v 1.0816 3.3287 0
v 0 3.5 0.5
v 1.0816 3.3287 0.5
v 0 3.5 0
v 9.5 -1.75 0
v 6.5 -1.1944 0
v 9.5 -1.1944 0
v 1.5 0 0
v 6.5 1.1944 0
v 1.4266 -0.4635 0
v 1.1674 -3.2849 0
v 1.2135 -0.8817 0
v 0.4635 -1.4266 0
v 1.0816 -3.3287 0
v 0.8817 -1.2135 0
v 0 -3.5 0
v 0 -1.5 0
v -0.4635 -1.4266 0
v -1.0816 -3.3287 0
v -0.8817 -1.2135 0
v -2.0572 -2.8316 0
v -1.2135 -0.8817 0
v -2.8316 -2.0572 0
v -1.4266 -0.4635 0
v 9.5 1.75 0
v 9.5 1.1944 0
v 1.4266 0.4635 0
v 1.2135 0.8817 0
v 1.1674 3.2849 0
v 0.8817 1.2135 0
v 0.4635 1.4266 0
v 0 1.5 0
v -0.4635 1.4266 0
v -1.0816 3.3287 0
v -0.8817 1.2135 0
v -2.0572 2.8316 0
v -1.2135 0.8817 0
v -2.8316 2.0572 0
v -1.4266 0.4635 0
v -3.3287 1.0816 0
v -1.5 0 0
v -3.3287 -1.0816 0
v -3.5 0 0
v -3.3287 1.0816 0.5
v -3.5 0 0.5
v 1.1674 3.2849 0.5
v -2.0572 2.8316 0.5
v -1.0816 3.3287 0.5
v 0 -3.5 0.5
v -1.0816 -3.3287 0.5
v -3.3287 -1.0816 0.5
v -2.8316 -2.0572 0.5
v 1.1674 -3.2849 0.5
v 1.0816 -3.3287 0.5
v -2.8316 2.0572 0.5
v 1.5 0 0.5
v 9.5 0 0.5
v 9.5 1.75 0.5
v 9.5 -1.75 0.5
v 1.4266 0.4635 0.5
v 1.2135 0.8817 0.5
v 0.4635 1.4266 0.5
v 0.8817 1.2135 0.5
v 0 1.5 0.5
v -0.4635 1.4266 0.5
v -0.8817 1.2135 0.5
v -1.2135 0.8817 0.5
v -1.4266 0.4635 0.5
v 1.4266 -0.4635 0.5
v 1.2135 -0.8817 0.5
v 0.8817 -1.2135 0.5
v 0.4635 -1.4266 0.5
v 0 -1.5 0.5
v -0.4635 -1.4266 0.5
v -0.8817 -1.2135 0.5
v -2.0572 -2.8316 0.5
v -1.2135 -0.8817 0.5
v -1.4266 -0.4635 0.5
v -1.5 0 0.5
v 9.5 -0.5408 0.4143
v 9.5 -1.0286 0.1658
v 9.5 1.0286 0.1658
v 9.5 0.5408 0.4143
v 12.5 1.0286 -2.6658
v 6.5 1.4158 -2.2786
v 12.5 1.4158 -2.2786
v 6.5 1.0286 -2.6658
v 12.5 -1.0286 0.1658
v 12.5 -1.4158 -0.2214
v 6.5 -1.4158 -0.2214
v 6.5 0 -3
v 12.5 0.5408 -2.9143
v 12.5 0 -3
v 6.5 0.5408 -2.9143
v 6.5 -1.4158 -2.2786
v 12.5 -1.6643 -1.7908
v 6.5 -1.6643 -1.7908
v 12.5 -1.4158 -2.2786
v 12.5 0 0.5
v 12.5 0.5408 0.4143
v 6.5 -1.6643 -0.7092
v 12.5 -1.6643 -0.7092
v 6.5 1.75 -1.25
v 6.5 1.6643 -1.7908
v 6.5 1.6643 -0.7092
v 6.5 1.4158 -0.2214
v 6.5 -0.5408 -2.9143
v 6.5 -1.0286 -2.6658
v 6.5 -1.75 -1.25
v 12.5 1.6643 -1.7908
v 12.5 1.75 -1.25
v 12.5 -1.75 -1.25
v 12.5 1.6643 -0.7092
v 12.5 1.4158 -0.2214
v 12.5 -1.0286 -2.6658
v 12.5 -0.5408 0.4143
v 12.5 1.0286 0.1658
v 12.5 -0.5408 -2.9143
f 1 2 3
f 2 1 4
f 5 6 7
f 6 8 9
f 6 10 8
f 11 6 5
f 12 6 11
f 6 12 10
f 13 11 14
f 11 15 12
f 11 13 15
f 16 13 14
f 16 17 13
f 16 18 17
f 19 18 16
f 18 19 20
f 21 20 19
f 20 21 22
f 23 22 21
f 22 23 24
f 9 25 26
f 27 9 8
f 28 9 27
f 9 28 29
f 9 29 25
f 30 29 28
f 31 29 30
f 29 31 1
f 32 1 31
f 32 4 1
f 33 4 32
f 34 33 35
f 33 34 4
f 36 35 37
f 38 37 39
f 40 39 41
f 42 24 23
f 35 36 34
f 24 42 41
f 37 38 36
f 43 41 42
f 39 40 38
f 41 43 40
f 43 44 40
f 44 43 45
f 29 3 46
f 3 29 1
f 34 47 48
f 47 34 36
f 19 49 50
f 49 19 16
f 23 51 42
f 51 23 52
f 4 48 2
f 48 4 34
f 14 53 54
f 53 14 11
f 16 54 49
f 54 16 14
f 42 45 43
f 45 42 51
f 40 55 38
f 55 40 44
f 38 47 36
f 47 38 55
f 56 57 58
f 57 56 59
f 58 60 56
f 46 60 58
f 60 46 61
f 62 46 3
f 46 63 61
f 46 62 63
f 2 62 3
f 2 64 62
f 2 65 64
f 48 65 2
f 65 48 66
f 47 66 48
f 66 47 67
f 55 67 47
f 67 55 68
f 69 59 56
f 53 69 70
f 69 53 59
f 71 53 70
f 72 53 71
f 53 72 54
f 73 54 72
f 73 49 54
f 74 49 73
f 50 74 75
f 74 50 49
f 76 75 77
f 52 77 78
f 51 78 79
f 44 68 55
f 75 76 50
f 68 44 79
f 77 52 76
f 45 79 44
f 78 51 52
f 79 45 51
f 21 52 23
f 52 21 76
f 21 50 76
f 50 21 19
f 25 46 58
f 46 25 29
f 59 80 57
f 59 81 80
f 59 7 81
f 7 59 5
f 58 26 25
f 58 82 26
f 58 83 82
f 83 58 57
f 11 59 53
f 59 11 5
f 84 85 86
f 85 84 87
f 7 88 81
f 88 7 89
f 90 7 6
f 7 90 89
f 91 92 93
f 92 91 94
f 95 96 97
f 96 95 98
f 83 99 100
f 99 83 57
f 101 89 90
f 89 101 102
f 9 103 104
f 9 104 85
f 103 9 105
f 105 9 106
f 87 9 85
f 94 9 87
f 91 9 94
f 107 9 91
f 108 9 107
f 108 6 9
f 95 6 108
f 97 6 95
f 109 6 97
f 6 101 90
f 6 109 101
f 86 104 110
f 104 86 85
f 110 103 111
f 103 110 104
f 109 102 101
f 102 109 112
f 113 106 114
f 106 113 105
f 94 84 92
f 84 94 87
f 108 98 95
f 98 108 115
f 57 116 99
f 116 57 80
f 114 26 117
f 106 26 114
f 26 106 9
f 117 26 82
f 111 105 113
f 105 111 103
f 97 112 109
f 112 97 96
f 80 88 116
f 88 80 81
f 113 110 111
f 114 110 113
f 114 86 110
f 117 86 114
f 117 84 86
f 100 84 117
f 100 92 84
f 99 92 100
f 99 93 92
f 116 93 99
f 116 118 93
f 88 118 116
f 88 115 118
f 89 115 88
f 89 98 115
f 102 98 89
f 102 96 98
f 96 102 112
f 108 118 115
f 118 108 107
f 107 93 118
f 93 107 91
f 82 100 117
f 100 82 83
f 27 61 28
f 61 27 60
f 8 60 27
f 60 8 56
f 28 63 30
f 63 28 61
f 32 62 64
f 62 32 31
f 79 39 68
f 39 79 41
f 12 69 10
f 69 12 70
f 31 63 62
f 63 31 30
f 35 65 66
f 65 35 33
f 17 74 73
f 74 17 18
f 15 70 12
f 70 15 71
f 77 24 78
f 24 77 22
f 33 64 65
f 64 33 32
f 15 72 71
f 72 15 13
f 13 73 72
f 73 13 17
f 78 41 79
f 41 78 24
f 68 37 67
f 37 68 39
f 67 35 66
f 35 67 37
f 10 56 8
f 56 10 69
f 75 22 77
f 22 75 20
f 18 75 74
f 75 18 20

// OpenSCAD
/*
    OpenPaddle

    Copyright (C) 2023  Matthias Jordan

    This program is free software: you can redistribute it and/or modify
    it under the terms of the GNU General Public License as published by
    the Free Software Foundation, either version 3 of the License, or
    (at your option) any later version.

    This program is distributed in the hope that it will be useful,
    but WITHOUT ANY WARRANTY; without even the implied warranty of
    MERCHANTABILITY or FITNESS FOR A PARTICULAR PURPOSE.  See the
    GNU General Public License for more details.

    You should have received a copy of the GNU General Public License
    along with this program.  If not, see <https://www.gnu.org/licenses/>.
*/    

//////////////////////////////////////////////////////////////////////
//
//
// A cable shoe.
//
//
//////////////////////////////////////////////////////////////////////

cable_shoe();

module cable_shoe(d1=7, d2=3, l=12.5, shaftd=3.5, thickness=0.5) {
    $fn=20;
    shaftlen=6;

    difference() {
        main();
        translate([0,0,-0.5]) cylinder(d=d2, h=thickness+1);
    }
    
    module main() {
        cylinder(r=d1/2, h=thickness);
        linear_extrude(height=thickness) polygon(points=[[0,-d1/2], [0,d1/2], [l-3,shaftd/2], [l-3,-shaftd/2]]);
        translate([l-shaftlen, 0, thickness-shaftd/2]) rotate([0,90,0]) cylinder(h=6, d=shaftd);
    }
}
